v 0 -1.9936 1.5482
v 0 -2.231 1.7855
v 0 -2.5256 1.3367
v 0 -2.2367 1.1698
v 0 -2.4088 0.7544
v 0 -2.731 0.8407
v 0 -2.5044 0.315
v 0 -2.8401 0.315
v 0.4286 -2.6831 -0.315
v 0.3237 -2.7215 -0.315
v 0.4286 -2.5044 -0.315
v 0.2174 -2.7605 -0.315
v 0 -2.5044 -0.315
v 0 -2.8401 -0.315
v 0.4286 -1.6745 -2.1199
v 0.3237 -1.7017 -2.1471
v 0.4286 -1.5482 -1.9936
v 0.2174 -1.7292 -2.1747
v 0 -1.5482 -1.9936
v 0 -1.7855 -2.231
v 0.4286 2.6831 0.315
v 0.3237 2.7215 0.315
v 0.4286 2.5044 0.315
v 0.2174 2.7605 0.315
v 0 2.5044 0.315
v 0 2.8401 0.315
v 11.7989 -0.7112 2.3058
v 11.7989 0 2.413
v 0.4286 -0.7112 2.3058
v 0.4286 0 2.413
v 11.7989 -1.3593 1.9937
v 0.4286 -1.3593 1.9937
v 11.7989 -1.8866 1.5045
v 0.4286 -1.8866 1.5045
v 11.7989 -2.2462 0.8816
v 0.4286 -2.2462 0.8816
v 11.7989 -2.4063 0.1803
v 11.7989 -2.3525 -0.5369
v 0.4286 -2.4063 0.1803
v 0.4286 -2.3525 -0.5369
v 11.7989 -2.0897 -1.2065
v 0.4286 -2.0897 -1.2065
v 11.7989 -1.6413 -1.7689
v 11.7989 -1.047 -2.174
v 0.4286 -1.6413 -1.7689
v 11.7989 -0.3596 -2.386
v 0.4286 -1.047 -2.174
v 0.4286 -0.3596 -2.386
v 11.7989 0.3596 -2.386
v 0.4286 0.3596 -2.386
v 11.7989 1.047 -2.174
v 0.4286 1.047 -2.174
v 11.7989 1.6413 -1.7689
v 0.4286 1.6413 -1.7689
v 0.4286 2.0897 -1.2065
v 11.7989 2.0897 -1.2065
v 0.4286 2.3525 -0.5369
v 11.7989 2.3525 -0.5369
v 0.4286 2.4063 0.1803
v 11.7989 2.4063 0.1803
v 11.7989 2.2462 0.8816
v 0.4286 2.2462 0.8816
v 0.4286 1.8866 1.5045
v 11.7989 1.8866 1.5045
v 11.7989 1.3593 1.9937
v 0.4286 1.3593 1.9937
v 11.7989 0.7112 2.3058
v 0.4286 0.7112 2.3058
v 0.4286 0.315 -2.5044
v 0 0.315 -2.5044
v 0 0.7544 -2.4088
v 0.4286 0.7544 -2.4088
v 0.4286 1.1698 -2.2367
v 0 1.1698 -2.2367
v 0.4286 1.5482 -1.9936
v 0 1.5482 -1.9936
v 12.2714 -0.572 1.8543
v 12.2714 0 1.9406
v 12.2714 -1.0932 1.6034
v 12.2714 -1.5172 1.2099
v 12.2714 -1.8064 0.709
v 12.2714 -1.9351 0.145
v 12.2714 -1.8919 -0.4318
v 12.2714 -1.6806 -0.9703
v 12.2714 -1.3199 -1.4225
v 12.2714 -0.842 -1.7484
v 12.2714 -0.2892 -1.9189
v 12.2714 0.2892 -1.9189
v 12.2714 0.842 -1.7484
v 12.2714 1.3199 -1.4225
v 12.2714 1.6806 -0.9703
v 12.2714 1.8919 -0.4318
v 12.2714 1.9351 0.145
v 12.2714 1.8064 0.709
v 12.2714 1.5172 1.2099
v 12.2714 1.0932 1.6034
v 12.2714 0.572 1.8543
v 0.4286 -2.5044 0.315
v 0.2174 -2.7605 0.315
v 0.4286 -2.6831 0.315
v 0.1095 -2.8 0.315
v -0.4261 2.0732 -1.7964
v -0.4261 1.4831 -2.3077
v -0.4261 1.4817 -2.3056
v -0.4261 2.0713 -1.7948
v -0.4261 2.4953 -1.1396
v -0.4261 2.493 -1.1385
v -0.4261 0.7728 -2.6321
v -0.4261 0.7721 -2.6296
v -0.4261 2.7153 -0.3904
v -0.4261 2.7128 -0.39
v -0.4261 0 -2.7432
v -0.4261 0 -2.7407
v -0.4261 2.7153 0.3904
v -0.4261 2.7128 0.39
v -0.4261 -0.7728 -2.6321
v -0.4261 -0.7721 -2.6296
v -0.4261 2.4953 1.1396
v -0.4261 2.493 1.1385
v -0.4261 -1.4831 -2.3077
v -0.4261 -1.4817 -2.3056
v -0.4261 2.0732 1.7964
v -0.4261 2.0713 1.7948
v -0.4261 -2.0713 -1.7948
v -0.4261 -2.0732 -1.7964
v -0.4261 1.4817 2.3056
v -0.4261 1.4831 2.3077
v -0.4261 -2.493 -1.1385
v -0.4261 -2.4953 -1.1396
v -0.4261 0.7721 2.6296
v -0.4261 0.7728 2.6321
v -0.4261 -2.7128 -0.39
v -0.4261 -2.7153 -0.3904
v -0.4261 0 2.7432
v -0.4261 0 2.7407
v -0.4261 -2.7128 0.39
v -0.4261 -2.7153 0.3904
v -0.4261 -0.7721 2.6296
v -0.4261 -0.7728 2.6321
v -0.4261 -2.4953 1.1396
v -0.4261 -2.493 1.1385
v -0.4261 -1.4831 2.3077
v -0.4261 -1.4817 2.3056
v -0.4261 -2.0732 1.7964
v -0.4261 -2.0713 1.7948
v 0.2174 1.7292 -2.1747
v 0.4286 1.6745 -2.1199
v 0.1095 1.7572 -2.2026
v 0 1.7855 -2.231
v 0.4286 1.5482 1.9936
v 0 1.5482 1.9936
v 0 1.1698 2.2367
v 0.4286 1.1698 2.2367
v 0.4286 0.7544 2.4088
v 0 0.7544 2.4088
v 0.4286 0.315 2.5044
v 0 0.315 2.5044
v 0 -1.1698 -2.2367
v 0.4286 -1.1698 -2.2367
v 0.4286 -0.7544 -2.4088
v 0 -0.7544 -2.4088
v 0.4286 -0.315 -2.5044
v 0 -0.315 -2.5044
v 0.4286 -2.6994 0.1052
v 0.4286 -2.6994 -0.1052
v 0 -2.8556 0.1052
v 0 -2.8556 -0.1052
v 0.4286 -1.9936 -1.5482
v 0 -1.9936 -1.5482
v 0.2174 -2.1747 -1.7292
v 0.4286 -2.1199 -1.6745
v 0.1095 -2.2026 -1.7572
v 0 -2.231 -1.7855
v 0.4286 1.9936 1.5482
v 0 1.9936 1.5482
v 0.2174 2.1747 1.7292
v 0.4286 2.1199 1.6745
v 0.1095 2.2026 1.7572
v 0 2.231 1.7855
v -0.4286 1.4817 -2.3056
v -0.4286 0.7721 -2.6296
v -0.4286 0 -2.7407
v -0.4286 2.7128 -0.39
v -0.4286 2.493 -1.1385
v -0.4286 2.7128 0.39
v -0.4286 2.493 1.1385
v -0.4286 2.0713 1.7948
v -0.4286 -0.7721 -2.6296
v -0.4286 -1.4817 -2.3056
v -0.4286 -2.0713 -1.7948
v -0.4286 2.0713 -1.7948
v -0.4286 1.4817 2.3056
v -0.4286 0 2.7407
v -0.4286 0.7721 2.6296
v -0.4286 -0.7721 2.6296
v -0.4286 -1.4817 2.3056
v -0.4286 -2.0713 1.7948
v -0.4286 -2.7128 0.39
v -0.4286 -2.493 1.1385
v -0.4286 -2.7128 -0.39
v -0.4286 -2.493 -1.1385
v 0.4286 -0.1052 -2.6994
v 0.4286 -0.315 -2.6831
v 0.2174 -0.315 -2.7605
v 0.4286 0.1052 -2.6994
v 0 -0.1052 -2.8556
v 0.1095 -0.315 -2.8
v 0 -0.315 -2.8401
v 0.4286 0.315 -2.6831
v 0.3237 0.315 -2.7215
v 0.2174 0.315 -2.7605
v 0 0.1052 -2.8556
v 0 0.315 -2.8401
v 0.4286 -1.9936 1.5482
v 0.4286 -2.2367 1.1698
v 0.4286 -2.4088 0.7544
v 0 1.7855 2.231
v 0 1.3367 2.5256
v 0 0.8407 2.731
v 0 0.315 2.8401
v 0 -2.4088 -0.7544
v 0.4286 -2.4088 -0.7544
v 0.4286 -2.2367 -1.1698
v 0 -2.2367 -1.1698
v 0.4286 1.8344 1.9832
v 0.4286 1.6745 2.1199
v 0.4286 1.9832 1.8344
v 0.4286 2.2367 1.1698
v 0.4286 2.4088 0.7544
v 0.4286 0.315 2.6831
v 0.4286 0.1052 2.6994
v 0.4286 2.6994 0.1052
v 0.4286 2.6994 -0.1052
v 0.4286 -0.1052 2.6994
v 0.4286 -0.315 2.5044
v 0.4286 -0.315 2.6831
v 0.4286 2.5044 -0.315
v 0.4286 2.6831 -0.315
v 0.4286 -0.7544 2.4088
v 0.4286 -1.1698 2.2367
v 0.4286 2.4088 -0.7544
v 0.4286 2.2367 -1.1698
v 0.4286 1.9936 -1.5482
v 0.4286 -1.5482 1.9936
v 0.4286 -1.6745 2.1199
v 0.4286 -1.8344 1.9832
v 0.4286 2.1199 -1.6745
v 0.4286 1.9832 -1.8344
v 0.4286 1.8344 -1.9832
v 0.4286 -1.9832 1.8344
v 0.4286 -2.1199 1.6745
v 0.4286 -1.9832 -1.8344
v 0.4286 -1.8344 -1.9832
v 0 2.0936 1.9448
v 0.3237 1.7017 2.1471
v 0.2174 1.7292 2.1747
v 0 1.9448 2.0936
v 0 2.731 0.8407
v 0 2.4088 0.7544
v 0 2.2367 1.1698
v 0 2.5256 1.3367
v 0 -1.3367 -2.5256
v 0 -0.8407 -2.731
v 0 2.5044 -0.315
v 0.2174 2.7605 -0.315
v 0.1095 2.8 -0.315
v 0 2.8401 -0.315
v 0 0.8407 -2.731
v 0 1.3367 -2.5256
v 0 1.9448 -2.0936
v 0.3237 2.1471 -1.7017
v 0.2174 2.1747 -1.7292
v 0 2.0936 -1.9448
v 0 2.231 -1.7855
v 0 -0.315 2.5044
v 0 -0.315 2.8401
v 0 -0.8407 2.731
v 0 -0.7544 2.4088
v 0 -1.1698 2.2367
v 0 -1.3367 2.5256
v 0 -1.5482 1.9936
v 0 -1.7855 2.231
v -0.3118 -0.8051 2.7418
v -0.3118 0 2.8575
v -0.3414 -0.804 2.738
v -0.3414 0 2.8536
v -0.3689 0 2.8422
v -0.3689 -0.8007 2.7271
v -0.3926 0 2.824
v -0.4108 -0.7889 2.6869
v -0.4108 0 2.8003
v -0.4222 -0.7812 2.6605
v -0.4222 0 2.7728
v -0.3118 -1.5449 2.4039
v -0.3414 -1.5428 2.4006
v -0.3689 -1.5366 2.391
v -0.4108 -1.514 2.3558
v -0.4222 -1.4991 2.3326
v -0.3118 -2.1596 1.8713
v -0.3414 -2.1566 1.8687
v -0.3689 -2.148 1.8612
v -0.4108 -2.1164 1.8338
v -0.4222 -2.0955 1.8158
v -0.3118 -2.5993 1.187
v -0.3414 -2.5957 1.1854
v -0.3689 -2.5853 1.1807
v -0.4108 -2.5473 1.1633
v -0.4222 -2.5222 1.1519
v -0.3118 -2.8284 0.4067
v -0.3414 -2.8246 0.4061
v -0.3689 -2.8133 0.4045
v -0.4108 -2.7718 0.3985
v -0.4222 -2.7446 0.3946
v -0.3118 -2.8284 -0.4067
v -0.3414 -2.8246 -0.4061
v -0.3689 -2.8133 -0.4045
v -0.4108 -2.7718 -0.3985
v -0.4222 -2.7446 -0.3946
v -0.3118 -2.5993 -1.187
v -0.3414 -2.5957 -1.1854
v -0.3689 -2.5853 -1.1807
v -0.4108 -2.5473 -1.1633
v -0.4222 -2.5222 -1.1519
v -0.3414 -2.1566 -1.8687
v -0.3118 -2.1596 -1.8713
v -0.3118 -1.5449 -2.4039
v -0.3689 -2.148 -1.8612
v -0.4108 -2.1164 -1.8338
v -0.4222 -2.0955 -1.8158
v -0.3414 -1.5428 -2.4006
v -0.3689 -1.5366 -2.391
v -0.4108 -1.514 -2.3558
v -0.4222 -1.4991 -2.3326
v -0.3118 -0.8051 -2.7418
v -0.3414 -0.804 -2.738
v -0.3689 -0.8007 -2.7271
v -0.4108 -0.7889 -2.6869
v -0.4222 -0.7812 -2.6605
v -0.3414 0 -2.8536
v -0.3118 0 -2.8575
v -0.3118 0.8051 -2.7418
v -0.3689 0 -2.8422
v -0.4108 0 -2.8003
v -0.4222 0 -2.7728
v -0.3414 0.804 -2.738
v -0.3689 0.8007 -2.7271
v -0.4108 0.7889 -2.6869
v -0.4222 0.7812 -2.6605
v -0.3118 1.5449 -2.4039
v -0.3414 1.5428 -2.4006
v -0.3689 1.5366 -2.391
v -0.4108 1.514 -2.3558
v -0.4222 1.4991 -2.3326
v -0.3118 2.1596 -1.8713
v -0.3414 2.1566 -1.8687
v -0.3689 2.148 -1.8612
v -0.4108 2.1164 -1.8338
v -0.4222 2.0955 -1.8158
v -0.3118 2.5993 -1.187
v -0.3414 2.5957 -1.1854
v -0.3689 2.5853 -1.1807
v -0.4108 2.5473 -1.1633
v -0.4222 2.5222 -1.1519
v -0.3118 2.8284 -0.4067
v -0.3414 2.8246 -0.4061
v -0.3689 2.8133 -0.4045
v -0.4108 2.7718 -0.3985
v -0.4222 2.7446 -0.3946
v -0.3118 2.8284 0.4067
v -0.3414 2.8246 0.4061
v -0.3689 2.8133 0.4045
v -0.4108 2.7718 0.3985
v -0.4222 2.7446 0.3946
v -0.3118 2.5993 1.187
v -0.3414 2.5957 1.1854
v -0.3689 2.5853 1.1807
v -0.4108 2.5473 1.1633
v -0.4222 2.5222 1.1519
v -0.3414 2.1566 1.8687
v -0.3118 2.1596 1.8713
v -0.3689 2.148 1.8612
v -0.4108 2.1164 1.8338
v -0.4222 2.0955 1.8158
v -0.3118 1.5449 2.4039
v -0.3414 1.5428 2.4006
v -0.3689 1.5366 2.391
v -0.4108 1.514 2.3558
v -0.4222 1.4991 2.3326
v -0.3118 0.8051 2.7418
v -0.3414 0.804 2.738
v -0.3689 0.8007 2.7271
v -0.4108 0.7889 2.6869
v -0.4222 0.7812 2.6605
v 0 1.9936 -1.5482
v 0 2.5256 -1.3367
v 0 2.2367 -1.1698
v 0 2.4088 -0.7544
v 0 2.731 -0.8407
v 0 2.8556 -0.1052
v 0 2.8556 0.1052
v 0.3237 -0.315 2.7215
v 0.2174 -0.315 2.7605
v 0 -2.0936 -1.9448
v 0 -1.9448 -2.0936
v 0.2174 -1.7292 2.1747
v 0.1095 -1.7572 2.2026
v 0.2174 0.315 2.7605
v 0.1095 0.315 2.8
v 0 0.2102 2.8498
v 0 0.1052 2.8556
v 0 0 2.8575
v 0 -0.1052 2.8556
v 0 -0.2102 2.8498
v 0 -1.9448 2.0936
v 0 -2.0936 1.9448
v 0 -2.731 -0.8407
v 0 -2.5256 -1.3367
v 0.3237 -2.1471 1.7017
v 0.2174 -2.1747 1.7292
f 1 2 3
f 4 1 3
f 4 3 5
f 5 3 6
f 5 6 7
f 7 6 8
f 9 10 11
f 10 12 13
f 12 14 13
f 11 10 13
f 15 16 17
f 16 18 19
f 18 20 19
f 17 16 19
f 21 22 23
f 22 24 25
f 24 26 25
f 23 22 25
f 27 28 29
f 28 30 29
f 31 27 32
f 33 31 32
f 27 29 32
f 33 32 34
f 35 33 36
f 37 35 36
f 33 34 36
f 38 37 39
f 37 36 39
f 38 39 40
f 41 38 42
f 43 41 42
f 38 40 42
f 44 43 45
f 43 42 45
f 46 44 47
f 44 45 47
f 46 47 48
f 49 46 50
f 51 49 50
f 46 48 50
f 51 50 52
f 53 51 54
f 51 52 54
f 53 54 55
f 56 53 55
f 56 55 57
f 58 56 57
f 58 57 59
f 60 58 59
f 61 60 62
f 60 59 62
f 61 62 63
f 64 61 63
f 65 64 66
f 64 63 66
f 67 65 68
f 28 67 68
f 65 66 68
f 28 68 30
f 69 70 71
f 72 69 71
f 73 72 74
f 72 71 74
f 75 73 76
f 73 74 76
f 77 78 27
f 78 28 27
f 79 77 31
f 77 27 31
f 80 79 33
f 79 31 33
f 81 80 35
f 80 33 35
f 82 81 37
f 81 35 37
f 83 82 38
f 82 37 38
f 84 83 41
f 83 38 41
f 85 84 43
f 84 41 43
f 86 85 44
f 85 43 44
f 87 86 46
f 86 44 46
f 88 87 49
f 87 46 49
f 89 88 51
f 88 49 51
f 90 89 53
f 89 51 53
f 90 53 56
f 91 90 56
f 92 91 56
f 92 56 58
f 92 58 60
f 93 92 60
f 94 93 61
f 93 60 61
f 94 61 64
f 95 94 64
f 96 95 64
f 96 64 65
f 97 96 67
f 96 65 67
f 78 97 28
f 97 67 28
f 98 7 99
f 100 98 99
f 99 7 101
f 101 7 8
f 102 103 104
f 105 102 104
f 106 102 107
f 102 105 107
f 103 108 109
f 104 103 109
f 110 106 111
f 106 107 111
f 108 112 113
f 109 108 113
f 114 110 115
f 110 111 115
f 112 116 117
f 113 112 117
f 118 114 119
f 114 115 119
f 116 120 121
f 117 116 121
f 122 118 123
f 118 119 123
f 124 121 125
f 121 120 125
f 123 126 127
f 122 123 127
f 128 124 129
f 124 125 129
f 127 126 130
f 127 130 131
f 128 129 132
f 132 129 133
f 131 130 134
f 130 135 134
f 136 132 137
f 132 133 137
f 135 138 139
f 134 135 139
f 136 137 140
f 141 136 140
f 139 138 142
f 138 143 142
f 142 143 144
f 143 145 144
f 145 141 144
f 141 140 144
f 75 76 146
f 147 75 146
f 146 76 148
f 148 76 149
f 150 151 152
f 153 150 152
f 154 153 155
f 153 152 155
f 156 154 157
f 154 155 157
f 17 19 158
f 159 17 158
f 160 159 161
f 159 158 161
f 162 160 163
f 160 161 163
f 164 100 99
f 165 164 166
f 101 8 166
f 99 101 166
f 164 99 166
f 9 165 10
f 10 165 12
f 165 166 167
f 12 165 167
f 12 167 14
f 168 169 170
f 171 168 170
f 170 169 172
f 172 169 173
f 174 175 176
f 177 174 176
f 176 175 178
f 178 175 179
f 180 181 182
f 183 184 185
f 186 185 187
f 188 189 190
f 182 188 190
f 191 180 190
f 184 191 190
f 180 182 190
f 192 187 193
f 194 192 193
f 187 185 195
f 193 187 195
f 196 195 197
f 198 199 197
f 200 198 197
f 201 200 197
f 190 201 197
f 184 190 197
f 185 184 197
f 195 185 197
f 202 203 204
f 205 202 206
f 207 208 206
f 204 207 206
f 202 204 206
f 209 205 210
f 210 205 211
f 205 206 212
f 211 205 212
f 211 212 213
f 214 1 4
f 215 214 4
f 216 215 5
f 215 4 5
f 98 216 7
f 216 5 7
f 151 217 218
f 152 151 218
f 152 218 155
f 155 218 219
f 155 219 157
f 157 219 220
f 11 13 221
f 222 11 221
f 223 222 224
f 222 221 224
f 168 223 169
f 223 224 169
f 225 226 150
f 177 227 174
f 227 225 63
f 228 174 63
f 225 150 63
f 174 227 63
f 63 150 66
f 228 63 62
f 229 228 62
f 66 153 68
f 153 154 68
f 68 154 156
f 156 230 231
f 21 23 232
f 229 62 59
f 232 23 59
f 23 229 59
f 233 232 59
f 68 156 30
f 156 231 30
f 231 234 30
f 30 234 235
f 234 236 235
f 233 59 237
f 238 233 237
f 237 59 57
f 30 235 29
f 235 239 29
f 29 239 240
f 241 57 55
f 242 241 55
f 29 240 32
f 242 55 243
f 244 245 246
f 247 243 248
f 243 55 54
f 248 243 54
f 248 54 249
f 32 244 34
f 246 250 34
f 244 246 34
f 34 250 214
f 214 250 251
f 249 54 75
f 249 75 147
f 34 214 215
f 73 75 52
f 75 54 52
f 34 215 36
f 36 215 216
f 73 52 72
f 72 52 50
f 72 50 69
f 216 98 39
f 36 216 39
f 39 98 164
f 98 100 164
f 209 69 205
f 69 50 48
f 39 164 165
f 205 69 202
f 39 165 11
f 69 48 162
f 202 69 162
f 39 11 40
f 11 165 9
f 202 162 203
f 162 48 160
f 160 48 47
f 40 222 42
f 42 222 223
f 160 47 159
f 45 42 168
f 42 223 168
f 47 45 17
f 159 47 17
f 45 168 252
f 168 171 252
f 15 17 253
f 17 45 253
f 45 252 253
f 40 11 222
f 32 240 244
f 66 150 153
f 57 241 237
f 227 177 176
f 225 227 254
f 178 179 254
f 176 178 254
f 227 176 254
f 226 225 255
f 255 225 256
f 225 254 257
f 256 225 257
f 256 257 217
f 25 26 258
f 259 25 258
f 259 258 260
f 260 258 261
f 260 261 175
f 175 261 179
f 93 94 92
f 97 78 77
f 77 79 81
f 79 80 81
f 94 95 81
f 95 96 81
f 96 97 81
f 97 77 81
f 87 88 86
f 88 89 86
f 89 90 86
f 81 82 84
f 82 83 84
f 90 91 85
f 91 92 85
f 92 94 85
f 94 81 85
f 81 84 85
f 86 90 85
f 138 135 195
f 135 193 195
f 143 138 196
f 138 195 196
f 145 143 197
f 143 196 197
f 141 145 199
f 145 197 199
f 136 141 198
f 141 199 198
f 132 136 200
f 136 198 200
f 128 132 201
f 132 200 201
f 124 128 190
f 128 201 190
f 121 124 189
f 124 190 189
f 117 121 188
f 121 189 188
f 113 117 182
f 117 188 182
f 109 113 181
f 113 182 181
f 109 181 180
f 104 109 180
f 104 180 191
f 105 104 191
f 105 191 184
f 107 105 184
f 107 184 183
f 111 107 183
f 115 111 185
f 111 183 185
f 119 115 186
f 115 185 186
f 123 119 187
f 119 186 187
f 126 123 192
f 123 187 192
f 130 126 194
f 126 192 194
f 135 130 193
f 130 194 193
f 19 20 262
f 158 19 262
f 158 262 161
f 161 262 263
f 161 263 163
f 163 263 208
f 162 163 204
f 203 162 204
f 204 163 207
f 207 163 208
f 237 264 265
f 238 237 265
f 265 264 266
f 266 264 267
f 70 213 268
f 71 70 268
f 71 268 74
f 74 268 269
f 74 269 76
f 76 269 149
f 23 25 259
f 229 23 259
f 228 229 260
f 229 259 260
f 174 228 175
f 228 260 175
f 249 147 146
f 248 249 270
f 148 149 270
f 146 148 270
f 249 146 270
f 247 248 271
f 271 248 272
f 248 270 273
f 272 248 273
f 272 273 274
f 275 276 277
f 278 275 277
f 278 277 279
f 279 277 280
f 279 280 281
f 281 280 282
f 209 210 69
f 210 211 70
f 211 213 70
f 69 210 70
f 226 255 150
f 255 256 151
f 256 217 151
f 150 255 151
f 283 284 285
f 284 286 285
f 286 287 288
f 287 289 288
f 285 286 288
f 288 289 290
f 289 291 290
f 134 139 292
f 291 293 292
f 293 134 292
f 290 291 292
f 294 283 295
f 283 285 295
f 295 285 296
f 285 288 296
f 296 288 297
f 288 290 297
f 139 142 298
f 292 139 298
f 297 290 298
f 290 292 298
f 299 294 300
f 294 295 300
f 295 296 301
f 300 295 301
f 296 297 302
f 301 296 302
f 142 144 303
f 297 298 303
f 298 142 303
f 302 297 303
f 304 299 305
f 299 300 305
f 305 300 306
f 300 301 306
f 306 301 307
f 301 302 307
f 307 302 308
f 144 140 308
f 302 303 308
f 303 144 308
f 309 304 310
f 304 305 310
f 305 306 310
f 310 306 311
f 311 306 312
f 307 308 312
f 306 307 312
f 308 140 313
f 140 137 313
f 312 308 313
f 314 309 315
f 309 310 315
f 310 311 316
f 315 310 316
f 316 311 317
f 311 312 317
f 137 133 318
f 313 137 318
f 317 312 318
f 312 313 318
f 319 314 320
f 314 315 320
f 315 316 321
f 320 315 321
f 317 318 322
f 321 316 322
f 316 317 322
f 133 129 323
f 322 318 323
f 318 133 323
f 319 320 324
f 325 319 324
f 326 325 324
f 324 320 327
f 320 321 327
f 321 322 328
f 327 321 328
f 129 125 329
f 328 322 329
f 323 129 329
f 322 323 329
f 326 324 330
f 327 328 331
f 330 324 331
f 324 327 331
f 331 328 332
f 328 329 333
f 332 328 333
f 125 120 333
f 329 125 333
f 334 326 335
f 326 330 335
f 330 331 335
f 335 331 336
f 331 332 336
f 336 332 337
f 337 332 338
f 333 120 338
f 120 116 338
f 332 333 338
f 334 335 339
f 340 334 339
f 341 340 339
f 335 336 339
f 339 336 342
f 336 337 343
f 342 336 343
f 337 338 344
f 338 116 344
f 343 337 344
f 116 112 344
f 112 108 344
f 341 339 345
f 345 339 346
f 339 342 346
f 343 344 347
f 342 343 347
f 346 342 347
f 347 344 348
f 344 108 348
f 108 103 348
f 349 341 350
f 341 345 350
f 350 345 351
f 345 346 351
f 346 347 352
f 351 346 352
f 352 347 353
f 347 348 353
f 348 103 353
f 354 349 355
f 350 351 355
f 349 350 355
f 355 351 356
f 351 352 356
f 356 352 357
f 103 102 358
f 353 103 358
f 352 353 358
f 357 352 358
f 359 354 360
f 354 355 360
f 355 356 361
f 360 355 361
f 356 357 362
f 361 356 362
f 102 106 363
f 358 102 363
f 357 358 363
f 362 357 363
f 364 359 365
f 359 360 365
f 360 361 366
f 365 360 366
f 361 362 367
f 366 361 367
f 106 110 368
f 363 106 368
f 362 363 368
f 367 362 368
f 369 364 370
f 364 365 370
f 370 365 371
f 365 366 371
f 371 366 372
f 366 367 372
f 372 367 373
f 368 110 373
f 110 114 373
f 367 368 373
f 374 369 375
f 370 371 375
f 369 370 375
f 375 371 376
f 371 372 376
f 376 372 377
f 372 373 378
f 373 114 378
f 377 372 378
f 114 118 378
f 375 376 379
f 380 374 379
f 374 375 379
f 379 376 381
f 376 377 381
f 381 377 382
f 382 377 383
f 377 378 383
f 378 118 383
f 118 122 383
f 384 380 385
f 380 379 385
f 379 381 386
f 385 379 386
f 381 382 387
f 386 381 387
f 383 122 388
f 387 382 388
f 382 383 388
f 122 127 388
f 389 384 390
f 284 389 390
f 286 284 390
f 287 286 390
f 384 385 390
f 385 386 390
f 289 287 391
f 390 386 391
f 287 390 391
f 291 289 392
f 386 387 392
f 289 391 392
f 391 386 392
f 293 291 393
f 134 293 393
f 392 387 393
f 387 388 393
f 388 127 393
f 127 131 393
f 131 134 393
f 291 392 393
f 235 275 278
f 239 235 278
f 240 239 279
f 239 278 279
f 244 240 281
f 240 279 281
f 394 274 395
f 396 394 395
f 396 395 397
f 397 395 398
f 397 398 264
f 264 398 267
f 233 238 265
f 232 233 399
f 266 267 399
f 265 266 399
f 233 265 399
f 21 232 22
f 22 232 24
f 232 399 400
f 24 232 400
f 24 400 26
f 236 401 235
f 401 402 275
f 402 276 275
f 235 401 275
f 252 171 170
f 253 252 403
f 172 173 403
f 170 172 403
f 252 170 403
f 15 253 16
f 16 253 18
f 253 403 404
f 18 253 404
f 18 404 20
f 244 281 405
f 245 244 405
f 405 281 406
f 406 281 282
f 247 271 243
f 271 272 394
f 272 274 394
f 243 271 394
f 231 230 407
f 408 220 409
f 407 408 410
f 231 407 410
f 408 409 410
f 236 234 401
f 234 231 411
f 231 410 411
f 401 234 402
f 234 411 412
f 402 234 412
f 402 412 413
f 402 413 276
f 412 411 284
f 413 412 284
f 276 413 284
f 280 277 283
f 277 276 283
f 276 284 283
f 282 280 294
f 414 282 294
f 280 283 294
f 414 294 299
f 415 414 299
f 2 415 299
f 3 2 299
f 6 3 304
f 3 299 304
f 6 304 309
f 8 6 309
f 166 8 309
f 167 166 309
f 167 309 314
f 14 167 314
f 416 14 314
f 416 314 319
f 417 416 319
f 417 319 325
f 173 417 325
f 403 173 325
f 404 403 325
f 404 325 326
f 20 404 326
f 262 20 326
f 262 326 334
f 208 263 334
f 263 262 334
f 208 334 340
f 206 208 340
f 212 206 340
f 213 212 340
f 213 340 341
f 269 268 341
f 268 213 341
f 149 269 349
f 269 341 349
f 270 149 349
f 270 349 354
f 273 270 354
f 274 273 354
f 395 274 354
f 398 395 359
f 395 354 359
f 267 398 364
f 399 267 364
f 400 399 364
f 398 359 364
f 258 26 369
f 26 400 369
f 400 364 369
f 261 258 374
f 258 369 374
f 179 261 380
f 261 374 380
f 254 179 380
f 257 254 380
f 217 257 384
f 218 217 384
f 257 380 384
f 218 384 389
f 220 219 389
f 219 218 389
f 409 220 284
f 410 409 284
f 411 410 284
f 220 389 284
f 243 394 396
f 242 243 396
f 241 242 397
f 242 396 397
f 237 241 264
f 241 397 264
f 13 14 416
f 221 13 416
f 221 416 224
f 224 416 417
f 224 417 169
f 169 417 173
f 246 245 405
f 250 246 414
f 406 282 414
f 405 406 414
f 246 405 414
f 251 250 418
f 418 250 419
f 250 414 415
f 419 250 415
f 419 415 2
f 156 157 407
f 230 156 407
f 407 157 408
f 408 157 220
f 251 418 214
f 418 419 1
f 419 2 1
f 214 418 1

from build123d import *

# Parameters (mm, degrees)
RIBCUT_START     = -0.428625
RIBCUT_DEPTH     = 0.428625
RIBCUTSPAT_COUNT = 8
RIBCUTSPAT_ANGLE = 315


with BuildPart() as part:
    # BodySke → BaseBody (revolve)
    with BuildSketch(Plane.XY, mode=Mode.PRIVATE) as basebody_sk:
        with BuildLine():
            Line((-0.428625, 2.74066), (-0.428625, 0))
            Line((-0.428625, 0), (12.271375, 0))
            Line((12.271375, 0), (12.271375, 1.94056))
            Line((12.271375, 1.94056), (11.798935, 2.413))
            Line((11.798935, 2.413), (0.428625, 2.413))
            Line((0.428625, 2.413), (0.428625, 2.701493258))
            Line((0.428625, 2.701493258), (0, 2.8575))
            Line((0, 2.8575), (-0.311785, 2.8575))
            ThreePointArc((-0.311785, 2.8575), (-0.392607305, 2.824022305), (-0.426085, 2.7432))
            Line((-0.426085, 2.7432), (-0.426085, 2.74066))
            Line((-0.426085, 2.74066), (-0.428625, 2.74066))
        make_face()
    revolve(basebody_sk.sketch.rotate(Axis((0, 0, 0), (1, 0, 0)), 90), axis=Axis((0, 0, 0), (1, 0, 0)))

    # RibCutSke → RibCut (cut)
    with BuildSketch(Plane(origin=(0.428625, 1.794401132, -0.090952894), x_dir=(0, 0, -1), z_dir=(1, 0, 0)).offset(RIBCUT_START)):
        with BuildLine():
            Line((0.224006808, 0.70999648), (0.224006808, 1.045688063))
            ThreePointArc((0.224006808, 1.045688063), (1.002565014, 0.845584632), (1.694583294, 0.436555338))
            Line((1.694583294, 0.436555338), (1.4572135, 0.199185543))
            ThreePointArc((1.4572135, 0.199185543), (0.874987925, 0.537586293), (0.224006808, 0.70999648))
        make_face()
    ribcut = extrude(amount=RIBCUT_DEPTH, mode=Mode.SUBTRACT)

    # RibCutsPat: RibCut ×8 about axis
    ribcutspat_axis = Axis((0, 0, 0), (1, 0, 0))
    for i in range(1, RIBCUTSPAT_COUNT):
        add(ribcut.rotate(ribcutspat_axis, i * RIBCUTSPAT_ANGLE / (RIBCUTSPAT_COUNT - 1)), mode=Mode.SUBTRACT)


solid = part.part
